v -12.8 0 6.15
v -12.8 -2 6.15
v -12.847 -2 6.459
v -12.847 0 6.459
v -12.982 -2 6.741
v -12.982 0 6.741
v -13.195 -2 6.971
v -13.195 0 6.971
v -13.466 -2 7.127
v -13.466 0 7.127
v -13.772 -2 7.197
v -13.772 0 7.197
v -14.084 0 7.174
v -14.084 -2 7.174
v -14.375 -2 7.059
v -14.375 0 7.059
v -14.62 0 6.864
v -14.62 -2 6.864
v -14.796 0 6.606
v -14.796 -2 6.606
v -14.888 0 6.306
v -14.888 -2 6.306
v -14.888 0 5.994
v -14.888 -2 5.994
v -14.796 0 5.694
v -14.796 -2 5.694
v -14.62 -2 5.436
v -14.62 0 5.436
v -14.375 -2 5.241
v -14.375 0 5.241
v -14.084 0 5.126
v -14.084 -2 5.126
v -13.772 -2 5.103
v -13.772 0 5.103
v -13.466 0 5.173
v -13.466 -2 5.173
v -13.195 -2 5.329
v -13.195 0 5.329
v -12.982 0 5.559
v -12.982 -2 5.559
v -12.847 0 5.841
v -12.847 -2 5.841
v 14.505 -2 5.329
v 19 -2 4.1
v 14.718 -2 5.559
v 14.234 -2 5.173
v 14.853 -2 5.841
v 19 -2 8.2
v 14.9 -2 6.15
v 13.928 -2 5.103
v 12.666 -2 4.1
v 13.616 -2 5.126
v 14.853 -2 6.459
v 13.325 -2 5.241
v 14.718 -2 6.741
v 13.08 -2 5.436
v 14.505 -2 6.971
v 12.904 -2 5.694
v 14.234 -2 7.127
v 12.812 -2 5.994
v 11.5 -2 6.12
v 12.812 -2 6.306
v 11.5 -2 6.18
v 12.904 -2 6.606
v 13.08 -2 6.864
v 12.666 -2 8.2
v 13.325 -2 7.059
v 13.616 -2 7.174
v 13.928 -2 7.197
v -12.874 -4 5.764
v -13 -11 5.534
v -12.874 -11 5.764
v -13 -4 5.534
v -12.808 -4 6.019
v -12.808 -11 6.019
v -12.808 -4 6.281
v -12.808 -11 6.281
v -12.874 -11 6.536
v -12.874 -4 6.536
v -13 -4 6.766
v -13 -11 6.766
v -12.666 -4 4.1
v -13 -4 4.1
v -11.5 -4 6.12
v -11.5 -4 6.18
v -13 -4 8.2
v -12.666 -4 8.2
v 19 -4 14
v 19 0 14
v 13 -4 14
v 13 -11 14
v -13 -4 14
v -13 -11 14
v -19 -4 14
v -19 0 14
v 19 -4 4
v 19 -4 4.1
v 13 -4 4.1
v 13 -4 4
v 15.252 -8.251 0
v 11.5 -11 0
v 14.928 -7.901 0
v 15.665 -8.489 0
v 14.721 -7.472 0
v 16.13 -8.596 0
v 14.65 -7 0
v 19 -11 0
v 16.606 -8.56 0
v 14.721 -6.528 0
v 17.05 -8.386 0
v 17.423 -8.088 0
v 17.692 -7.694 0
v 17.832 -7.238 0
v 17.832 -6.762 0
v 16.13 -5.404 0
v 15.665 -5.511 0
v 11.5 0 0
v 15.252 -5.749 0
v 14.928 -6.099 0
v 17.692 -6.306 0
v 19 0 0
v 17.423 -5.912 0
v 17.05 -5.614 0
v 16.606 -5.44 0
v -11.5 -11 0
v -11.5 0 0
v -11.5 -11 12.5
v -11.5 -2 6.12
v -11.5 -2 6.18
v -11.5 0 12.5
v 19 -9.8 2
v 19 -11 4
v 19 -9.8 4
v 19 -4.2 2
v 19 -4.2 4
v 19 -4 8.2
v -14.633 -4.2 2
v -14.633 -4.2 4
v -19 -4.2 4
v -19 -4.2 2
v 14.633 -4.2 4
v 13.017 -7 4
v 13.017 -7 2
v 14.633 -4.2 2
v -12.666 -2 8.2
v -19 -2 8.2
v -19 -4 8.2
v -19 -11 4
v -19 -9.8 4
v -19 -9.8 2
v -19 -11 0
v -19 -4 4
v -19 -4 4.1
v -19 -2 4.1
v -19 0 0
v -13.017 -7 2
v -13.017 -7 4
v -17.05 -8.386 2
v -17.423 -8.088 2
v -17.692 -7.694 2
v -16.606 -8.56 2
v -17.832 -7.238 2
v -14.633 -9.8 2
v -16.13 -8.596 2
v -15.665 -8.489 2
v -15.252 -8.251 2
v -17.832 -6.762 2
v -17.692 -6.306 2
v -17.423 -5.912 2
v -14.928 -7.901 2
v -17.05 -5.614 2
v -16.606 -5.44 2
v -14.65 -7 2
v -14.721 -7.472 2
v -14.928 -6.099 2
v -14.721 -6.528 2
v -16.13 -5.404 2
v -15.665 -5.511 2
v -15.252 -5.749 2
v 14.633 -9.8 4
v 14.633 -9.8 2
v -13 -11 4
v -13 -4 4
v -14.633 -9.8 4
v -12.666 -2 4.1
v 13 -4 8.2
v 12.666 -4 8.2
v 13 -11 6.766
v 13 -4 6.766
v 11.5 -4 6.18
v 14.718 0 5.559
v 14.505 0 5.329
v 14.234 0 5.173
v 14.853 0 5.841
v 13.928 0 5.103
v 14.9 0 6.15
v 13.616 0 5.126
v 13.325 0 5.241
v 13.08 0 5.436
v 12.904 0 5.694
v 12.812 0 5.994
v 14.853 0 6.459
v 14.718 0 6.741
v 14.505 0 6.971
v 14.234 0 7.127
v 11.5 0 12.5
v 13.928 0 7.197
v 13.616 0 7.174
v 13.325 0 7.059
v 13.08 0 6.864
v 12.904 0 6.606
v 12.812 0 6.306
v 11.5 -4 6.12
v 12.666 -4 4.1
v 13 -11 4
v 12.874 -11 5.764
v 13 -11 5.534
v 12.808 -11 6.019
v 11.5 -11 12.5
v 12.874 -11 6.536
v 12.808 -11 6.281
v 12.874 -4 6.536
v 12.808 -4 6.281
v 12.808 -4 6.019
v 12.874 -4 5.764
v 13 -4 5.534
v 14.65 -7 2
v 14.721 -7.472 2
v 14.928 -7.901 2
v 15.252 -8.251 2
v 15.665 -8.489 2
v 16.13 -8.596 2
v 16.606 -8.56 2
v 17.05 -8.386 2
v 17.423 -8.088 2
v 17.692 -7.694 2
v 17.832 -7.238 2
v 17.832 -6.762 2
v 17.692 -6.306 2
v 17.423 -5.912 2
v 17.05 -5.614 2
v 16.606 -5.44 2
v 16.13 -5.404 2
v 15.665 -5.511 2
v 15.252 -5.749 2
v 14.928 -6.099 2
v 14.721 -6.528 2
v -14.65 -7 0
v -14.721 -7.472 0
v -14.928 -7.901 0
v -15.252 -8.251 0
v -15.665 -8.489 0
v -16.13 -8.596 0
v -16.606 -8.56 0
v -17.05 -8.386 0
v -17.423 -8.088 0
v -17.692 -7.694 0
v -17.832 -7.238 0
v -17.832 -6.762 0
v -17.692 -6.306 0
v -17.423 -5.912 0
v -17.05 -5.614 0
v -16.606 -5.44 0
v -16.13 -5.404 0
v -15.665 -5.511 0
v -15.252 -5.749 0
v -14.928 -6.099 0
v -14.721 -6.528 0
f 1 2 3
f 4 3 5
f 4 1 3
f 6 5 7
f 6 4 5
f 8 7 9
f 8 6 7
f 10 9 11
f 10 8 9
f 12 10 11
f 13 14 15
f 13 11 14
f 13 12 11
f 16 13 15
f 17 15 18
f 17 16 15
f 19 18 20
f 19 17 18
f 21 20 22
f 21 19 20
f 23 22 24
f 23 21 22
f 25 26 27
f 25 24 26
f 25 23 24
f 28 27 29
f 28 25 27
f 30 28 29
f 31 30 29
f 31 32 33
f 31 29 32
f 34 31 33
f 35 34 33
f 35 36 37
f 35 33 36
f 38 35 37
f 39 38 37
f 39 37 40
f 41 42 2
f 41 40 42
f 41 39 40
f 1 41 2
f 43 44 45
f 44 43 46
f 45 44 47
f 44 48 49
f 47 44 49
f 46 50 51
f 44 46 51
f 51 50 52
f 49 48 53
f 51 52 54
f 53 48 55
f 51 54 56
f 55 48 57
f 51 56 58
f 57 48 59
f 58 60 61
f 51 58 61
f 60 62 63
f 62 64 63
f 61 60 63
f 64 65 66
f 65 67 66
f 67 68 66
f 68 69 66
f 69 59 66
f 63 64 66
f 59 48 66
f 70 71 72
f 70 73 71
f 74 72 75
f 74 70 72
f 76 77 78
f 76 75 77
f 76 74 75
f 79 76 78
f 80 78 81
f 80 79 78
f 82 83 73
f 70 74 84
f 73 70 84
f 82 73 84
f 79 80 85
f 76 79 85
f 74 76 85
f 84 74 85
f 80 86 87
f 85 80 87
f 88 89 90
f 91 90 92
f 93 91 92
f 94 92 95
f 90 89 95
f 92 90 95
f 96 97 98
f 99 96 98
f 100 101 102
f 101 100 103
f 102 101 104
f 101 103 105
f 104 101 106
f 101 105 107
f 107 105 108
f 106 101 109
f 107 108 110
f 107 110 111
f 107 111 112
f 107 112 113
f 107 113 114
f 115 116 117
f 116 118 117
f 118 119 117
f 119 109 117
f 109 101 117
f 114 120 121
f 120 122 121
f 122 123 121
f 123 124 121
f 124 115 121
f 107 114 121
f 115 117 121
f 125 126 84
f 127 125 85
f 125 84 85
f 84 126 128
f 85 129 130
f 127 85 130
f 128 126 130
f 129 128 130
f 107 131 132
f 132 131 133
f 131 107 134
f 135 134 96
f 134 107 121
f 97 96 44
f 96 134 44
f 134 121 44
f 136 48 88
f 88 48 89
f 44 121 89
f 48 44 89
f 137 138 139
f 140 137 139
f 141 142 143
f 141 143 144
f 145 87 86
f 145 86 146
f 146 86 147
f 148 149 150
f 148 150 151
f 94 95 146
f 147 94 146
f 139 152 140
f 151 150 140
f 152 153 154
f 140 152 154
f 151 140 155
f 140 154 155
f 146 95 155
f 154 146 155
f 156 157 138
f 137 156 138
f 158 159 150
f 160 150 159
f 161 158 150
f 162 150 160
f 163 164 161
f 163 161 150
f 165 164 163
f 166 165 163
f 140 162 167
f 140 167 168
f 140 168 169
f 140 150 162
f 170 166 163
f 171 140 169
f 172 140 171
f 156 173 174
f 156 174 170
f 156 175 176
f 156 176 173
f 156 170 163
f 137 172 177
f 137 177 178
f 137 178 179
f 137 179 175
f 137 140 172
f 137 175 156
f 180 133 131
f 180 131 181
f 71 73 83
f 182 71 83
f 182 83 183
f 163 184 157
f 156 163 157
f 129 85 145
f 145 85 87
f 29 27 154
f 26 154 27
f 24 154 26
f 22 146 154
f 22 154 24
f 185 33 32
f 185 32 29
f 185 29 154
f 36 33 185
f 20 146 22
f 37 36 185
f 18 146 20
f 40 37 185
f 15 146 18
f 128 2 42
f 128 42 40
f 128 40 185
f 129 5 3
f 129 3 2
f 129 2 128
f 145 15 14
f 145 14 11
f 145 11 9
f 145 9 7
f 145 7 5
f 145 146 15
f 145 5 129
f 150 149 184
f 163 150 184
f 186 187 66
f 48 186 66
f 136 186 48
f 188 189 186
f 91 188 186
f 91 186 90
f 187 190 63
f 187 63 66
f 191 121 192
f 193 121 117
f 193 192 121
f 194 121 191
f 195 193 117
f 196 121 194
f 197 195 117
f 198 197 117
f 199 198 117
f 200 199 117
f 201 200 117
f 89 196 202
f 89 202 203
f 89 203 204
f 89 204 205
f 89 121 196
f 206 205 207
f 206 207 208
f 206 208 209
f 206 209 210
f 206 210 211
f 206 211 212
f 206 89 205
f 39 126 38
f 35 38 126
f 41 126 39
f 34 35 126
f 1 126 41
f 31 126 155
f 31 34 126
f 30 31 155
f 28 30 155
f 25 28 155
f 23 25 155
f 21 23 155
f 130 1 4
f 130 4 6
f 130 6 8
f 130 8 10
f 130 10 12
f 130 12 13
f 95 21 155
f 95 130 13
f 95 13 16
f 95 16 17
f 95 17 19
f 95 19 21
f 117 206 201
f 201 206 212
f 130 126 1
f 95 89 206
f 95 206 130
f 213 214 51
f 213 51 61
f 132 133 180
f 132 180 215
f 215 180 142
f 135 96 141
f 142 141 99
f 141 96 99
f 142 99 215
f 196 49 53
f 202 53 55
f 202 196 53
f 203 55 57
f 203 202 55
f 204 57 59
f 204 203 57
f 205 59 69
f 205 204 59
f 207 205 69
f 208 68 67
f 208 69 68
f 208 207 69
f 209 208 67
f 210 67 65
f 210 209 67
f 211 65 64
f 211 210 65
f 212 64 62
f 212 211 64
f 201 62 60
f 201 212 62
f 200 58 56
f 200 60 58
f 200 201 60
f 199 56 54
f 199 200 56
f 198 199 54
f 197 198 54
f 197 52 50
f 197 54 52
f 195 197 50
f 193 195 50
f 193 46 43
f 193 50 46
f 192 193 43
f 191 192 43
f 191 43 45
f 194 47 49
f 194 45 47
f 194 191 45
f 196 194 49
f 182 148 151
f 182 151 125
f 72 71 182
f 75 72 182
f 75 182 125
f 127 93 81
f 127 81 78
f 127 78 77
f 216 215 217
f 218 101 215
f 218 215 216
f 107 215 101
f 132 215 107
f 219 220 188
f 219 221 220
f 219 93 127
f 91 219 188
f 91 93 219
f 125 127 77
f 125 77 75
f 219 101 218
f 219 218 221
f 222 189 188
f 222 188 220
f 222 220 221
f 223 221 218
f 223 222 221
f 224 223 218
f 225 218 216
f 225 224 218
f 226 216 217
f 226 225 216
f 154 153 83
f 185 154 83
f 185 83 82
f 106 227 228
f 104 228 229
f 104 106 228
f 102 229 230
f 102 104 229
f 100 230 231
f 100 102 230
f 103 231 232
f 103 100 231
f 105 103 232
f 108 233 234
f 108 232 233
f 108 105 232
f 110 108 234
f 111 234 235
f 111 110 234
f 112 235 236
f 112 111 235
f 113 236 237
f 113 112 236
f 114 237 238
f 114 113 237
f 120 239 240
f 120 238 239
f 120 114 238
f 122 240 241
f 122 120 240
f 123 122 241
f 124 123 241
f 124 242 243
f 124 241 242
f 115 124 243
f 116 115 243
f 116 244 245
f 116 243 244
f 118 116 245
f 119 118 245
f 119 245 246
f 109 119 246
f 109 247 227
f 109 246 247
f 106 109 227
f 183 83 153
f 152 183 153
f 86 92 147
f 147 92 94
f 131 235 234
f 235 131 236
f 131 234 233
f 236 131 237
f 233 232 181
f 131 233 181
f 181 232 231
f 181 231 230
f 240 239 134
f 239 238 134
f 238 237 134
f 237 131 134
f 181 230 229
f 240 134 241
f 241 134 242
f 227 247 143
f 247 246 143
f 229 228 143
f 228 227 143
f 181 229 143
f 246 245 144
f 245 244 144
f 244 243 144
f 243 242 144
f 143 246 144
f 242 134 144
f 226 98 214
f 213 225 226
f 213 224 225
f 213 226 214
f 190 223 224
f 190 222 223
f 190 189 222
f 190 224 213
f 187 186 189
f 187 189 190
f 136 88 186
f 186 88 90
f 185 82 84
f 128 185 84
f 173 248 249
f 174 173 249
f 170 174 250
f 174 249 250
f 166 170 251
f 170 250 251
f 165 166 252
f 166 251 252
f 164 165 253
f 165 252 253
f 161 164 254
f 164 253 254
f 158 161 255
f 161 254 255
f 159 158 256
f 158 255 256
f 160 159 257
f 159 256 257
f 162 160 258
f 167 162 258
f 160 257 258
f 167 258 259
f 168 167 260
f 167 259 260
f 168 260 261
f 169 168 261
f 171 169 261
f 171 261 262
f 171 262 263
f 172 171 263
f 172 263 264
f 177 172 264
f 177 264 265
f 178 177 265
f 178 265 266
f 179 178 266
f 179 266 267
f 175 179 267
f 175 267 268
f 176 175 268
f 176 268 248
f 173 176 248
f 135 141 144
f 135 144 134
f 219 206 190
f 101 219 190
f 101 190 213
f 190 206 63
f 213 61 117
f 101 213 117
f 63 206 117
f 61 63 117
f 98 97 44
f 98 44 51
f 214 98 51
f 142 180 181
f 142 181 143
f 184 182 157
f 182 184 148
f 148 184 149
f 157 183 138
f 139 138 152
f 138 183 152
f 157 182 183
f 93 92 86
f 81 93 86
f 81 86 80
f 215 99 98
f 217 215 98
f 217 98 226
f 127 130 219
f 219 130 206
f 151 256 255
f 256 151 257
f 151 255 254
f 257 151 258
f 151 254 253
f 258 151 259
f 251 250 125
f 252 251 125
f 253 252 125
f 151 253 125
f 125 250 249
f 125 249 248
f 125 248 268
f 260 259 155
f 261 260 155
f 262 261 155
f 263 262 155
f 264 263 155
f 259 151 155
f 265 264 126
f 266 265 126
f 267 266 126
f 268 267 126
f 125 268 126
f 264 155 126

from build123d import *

# Parameters (mm, degrees)
F1_DEPTH        = 11
F2_W            = 6
F2_H            = 10
F3_DEPTH        = 4
F4_R            = 1.05
F5_DEPTH        = 11
F5_COPIES_COUNT = 2
F5_COPIES_PITCH = 27.7
F7_DEPTH        = 2
F8_R            = 1.6
F9_DEPTH        = 4
F11_DEPTH       = 2


# Not quite as in the source:
# - a pattern or mirror of a feature is missing from the dataset's text; its kind, count and spacing are read off the source's solid


with BuildPart() as f1:
    # F0 (on Front) → F1 (new body)
    with BuildSketch(Plane.XZ):
        Polygon((-19, 4), (-19, 0), (-11.5, 0), (-11.5, 12.5), (11.5, 12.5), (11.5, 0), (19, 0), (19, 4), (13, 4), (13, 14), (-13, 14), (-13, 4), align=None)
    extrude(amount=F1_DEPTH)

    # F2 (on face) → F3 (join)
    with BuildSketch(Plane(origin=(0, 0, 0), x_dir=(-1, 0, 0), z_dir=(0, 1, 0))):
        with Locations((-16, 9)):
            Rectangle(F2_W, F2_H)
        with Locations((16, 9)):
            Rectangle(F2_W, F2_H)
    extrude(amount=-F3_DEPTH)

    # F4 (on Front) → F5 (cut, through all)
    with BuildSketch(Plane.XZ):
        with Locations((-13.85, 6.15)):
            Circle(F4_R)
    f5 = extrude(amount=F5_DEPTH, mode=Mode.SUBTRACT)

    # F5_copies: F5 ×2
    with Locations(*[(i * F5_COPIES_PITCH, 0, 0) for i in range(1, F5_COPIES_COUNT)]):
        add(f5, mode=Mode.SUBTRACT)

    # F6 (on face) → F7 (cut)
    with BuildSketch(Plane.XZ.offset(4)):
        Polygon((-12.6664319482, 8.2), (-15.0335680518, 8.2), (-16.2171361037, 6.15), (-15.0335680518, 4.1), (-12.6664319482, 4.1), (-11.4828638963, 6.15), align=None)
        Polygon((-16.2171361037, 6.15), (-15.0335680518, 8.2), (-19, 8.2), (-19, 4.1), (-15.0335680518, 4.1), align=None)
    f7 = extrude(amount=-F7_DEPTH, mode=Mode.SUBTRACT)

    # F7_copies: F7 across plane
    add(f7.mirror(Plane(origin=(0, 0, 0), x_dir=(0, 0, 1), z_dir=(1, 0, 0))), mode=Mode.SUBTRACT)

    # F8 (on face) → F9 (cut, through all)
    with BuildSketch(Plane(origin=(0, 0, 0), x_dir=(1, 0, 0), z_dir=(0, 0, -1))):
        with Locations((-16.25, 7)):
            Circle(F8_R)
    f9 = extrude(amount=-F9_DEPTH, mode=Mode.SUBTRACT)

    # F9_copies: F9 across plane
    add(f9.mirror(Plane(origin=(0, 0, 0), x_dir=(0, 0, 1), z_dir=(1, 0, 0))), mode=Mode.SUBTRACT)

    # F10 (on face) → F11 (cut)
    with BuildSketch(Plane.XY.offset(4)):
        Polygon((-14.6334192463, -4.2), (-17.8665807537, -4.2), (-19, -6.1631397208), (-19, -7.8368602792), (-17.8665807537, -9.8), (-14.6334192463, -9.8), (-13.0168384925, -7), align=None)
        Polygon((-19, -6.1631397208), (-17.8665807537, -4.2), (-19, -4.2), align=None)
        Polygon((-19, -7.8368602792), (-19, -6.1631397208), (-19.4831615075, -7), align=None)
        Polygon((-17.8665807537, -9.8), (-19, -7.8368602792), (-19, -9.8), align=None)
    f11 = extrude(amount=-F11_DEPTH, mode=Mode.SUBTRACT)

    # F11_copies: F11 across plane
    add(f11.mirror(Plane(origin=(0, 0, 0), x_dir=(0, 0, 1), z_dir=(1, 0, 0))), mode=Mode.SUBTRACT)


solid = f1.part
